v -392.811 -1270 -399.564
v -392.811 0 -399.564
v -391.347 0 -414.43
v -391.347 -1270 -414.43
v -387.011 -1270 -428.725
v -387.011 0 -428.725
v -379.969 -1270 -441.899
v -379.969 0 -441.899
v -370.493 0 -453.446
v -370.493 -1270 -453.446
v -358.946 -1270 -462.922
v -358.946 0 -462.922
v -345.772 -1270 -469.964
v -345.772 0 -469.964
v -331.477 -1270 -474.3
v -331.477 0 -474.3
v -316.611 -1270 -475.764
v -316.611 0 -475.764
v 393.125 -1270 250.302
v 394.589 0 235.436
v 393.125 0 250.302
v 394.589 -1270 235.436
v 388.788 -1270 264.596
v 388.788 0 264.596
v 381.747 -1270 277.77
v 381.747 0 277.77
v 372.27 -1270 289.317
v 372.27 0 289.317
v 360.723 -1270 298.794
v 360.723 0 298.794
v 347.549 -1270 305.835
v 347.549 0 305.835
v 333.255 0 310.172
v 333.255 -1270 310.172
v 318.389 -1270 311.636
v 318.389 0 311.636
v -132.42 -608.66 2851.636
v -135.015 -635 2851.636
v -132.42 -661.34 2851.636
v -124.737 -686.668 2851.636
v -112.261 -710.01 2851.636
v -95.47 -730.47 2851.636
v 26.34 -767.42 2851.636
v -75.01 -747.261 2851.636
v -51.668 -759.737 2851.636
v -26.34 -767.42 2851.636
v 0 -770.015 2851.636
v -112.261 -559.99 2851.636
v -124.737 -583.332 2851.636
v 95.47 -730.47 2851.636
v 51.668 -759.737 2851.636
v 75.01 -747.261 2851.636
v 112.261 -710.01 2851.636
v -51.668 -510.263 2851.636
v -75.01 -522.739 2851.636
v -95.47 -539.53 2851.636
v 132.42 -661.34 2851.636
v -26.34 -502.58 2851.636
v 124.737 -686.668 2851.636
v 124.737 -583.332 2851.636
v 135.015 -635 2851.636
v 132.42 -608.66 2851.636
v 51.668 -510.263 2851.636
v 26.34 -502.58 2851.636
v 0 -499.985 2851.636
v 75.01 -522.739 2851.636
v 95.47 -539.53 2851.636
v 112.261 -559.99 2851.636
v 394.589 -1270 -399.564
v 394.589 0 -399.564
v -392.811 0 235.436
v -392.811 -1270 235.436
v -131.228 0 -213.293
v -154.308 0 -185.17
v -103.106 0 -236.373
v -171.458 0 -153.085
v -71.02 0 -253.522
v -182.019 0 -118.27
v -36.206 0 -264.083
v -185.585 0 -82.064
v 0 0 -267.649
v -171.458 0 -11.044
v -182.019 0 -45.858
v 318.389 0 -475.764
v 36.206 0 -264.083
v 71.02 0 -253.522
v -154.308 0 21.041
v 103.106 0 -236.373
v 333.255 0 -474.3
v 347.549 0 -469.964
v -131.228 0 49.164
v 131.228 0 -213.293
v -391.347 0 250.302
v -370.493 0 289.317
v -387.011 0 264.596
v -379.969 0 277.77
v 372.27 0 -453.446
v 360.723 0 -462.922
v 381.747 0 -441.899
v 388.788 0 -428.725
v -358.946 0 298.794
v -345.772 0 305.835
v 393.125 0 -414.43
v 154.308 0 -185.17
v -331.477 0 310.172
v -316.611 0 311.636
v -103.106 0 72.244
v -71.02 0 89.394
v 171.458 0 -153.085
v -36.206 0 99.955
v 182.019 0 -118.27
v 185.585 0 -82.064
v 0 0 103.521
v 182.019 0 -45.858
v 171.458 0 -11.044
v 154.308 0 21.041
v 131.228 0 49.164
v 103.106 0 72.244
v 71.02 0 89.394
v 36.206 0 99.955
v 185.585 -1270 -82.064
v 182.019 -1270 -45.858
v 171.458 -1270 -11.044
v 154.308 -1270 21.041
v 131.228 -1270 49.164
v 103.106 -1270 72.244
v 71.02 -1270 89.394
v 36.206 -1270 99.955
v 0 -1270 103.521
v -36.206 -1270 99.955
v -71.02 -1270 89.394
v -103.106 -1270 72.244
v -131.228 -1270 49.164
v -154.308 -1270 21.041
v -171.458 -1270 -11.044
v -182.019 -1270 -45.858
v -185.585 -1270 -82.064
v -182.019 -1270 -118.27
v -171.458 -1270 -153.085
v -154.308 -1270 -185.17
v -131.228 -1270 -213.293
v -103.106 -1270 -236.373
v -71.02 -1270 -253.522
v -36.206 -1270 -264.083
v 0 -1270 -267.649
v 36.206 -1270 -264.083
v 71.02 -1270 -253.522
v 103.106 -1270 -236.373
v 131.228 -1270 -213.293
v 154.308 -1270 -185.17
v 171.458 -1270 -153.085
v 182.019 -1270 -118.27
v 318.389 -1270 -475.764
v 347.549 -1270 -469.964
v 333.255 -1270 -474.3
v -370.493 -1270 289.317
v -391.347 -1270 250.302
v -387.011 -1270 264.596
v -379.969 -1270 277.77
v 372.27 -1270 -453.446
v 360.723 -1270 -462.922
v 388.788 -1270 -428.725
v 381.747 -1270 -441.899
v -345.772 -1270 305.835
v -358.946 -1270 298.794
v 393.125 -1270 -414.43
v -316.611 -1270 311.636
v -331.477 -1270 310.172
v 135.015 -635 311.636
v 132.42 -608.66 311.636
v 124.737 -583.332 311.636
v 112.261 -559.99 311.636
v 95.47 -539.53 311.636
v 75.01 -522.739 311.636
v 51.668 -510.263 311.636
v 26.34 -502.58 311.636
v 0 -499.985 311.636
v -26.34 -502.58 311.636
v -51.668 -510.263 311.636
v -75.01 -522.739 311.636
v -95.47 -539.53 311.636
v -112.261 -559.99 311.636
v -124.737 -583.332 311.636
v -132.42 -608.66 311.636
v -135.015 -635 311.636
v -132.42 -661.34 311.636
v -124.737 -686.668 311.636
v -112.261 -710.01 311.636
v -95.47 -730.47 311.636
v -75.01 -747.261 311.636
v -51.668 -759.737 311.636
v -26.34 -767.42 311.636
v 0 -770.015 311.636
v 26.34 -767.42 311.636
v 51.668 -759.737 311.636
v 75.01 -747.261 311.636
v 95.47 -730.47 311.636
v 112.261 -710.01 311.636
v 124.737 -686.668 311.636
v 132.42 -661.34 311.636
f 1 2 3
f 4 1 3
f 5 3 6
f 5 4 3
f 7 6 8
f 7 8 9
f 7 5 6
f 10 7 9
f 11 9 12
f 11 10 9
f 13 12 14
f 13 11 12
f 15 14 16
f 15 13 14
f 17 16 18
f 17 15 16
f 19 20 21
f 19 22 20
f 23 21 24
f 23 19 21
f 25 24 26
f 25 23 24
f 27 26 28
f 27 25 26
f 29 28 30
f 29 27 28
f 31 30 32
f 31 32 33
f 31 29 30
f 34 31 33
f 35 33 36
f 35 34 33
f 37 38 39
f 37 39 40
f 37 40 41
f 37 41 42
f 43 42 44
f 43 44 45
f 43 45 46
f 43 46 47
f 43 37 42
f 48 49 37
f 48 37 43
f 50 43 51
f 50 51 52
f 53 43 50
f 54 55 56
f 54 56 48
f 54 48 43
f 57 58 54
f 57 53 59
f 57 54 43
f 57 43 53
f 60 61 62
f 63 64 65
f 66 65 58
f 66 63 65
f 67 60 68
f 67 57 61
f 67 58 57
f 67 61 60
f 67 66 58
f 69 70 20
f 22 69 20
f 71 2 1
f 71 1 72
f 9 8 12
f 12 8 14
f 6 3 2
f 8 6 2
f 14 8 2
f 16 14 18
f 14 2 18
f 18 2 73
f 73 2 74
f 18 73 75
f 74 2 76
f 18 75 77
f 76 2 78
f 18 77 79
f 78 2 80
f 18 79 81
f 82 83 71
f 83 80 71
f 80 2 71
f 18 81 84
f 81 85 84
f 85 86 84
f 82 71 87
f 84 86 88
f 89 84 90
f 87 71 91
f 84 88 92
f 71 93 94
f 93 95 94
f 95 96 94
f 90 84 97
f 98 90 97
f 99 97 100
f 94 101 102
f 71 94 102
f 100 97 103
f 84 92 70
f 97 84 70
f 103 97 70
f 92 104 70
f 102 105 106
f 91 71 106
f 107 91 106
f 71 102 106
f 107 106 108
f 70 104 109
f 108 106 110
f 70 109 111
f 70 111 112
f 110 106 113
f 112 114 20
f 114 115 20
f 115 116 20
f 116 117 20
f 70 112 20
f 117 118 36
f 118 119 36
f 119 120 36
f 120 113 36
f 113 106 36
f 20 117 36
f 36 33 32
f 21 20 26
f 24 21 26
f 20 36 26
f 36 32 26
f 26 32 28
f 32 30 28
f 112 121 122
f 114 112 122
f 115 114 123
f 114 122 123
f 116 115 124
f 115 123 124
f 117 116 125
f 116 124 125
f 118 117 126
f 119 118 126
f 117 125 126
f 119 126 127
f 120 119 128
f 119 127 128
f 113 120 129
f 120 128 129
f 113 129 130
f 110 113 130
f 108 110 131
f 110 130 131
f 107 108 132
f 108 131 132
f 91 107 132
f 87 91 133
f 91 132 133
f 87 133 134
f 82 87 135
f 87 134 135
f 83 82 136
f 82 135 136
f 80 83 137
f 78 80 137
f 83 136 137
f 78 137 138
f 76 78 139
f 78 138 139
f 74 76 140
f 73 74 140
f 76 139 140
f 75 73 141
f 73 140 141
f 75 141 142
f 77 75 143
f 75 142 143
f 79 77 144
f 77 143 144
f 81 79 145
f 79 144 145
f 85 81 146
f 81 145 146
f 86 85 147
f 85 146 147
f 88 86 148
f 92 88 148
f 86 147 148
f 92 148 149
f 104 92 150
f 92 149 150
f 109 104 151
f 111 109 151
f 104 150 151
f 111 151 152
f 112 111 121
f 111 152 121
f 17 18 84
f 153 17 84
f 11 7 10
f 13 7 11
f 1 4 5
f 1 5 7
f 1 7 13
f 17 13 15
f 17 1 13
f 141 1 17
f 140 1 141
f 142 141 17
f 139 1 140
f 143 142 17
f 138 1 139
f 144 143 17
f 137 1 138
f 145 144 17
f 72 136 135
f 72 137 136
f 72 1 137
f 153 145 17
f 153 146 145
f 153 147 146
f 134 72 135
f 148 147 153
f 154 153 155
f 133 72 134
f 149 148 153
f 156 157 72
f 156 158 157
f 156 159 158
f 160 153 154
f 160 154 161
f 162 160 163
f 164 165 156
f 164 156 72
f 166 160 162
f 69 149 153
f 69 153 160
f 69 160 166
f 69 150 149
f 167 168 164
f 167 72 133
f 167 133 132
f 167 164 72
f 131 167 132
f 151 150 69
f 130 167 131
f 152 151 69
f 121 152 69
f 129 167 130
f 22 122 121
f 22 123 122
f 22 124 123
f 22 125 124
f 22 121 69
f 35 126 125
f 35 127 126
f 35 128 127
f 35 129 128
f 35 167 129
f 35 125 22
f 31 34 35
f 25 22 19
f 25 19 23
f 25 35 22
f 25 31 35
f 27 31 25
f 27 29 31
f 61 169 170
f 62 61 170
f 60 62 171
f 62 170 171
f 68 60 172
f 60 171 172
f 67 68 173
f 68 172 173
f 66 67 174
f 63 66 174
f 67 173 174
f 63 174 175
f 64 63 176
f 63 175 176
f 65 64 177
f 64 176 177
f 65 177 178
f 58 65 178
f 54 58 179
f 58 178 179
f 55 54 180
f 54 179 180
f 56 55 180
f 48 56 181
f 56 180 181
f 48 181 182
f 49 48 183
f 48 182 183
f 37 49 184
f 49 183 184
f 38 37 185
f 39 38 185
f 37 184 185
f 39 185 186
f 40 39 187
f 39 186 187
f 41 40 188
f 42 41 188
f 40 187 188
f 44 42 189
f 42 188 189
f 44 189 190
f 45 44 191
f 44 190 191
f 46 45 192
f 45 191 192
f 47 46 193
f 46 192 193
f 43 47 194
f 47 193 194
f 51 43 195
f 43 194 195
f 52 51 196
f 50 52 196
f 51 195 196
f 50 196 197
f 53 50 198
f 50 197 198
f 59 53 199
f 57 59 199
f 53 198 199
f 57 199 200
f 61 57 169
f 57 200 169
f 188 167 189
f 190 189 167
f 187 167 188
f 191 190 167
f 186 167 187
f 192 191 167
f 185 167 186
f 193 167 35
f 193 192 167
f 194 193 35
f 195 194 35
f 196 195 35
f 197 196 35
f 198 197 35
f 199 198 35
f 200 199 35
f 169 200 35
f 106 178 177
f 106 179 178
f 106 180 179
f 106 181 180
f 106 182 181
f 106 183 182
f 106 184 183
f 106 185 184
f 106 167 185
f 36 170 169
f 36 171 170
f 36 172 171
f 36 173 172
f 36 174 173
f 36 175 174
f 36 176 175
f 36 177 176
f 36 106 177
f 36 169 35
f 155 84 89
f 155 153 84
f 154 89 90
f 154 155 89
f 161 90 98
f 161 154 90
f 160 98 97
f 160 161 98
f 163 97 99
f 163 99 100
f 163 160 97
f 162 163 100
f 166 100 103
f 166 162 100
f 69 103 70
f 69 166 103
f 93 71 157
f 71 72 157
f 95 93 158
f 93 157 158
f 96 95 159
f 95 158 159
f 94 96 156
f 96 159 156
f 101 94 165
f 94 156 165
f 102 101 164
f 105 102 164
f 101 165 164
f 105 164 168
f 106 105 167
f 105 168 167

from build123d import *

# Parameters (mm, degrees)
F0_W     = 787.4
F0_H     = 787.4
F1_DEPTH = 1270
F2_R     = 76.2
F3_R     = 185.5851
F4_DEPTH = 1270
F5_R     = 135.014688
F6_DEPTH = 2540


with BuildPart() as f1:
    # F0 (on Front) → F1 (new body)
    with BuildSketch(Plane.XZ):
        with Locations((0.888865, -82.064181)):
            Rectangle(F0_W, F0_H)
    extrude(amount=F1_DEPTH)

    # F2
    f2_edges = [f1.edges().sort_by_distance(p)[0] for p in [
        (394.588865, -635, 311.635819),
        (-392.811135, -635, 311.635819),
        (-392.811135, -635, -475.764181),
        (394.588865, -635, -475.764181),
    ]]
    fillet(f2_edges, radius=F2_R)

    # F3 (on face) → F4 (cut)
    with BuildSketch(Plane.XZ.offset(1270)):
        with Locations((0, -82.064181)):
            Circle(F3_R)
    extrude(amount=-F4_DEPTH, mode=Mode.SUBTRACT)

    # F5 (on face) → F6 (join)
    with BuildSketch(Plane.XY.offset(311.635819)):
        with Locations((0, -635)):
            Circle(F5_R)
    extrude(amount=F6_DEPTH)


solid = f1.part
